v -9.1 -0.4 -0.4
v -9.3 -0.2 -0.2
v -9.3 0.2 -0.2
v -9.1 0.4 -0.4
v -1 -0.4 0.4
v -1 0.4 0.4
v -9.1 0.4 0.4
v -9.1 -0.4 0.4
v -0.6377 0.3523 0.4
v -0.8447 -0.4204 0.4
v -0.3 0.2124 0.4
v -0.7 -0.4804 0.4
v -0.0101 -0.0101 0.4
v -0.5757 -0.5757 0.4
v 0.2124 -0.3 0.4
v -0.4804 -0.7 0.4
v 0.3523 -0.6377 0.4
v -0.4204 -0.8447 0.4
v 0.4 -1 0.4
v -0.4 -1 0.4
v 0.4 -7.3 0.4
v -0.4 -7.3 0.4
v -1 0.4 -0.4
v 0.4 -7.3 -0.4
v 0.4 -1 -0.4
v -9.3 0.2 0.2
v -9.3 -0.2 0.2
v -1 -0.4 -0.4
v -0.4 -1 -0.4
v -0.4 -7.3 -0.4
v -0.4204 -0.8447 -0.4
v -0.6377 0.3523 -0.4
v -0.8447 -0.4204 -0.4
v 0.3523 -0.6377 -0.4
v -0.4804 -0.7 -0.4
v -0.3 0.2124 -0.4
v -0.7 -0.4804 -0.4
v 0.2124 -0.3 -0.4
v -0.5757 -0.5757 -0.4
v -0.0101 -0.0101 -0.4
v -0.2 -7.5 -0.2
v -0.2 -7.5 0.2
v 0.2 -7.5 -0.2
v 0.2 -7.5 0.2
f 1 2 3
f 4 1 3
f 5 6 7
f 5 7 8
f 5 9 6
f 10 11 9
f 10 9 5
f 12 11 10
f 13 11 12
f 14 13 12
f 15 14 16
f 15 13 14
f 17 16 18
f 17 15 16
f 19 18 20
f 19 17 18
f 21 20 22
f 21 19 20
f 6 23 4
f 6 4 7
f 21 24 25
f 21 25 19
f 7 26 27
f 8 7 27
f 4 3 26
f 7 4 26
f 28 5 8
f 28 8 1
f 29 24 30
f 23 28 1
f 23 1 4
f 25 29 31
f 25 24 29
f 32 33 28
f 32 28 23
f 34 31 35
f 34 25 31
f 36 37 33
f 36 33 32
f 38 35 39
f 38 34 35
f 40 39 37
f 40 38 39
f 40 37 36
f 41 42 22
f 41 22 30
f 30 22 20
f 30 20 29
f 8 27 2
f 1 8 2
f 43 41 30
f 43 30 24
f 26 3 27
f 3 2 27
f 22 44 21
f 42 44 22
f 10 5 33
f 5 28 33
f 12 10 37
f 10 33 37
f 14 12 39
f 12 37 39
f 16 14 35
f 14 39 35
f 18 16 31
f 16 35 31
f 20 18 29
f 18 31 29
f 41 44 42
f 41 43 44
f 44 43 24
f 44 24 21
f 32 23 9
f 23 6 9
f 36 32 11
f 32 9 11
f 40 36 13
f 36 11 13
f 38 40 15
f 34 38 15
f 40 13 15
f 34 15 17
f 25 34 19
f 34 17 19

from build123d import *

# Parameters (mm, degrees)
SKETCH2_W     = 0.8
SKETCH2_H     = 0.8
CHAMFER1_SIZE = 0.2


with BuildPart() as part:
    # Sweep1: sweep along a path in Sketch1
    with BuildLine(Plane.XY) as sweep1_path:
        Line((-9.3, 0), (-1, 0))
        ThreePointArc((-1, 0), (-0.292893219, -0.292893219), (0, -1))
        Line((0, -1), (0, -7.5))
    # Sketch2 → Sweep1 (sweep)
    with BuildSketch(Plane(origin=(-9.3, 0, 0), x_dir=(0, 0, -1), z_dir=(1, 0, 0))):
        Rectangle(SKETCH2_W, SKETCH2_H)
    sweep(path=sweep1_path.line)

    # Chamfer1
    chamfer1_edges = [part.edges().sort_by_distance(p)[0] for p in [
        (0, -7.5, 0.4),
        (0.4, -7.5, 0),
        (0, -7.5, -0.4),
        (-0.4, -7.5, 0),
        (-9.3, 0.4, 0),
        (-9.3, 0, -0.4),
        (-9.3, -0.4, 0),
        (-9.3, 0, 0.4),
    ]]
    chamfer(chamfer1_edges, length=CHAMFER1_SIZE)


solid = part.part
